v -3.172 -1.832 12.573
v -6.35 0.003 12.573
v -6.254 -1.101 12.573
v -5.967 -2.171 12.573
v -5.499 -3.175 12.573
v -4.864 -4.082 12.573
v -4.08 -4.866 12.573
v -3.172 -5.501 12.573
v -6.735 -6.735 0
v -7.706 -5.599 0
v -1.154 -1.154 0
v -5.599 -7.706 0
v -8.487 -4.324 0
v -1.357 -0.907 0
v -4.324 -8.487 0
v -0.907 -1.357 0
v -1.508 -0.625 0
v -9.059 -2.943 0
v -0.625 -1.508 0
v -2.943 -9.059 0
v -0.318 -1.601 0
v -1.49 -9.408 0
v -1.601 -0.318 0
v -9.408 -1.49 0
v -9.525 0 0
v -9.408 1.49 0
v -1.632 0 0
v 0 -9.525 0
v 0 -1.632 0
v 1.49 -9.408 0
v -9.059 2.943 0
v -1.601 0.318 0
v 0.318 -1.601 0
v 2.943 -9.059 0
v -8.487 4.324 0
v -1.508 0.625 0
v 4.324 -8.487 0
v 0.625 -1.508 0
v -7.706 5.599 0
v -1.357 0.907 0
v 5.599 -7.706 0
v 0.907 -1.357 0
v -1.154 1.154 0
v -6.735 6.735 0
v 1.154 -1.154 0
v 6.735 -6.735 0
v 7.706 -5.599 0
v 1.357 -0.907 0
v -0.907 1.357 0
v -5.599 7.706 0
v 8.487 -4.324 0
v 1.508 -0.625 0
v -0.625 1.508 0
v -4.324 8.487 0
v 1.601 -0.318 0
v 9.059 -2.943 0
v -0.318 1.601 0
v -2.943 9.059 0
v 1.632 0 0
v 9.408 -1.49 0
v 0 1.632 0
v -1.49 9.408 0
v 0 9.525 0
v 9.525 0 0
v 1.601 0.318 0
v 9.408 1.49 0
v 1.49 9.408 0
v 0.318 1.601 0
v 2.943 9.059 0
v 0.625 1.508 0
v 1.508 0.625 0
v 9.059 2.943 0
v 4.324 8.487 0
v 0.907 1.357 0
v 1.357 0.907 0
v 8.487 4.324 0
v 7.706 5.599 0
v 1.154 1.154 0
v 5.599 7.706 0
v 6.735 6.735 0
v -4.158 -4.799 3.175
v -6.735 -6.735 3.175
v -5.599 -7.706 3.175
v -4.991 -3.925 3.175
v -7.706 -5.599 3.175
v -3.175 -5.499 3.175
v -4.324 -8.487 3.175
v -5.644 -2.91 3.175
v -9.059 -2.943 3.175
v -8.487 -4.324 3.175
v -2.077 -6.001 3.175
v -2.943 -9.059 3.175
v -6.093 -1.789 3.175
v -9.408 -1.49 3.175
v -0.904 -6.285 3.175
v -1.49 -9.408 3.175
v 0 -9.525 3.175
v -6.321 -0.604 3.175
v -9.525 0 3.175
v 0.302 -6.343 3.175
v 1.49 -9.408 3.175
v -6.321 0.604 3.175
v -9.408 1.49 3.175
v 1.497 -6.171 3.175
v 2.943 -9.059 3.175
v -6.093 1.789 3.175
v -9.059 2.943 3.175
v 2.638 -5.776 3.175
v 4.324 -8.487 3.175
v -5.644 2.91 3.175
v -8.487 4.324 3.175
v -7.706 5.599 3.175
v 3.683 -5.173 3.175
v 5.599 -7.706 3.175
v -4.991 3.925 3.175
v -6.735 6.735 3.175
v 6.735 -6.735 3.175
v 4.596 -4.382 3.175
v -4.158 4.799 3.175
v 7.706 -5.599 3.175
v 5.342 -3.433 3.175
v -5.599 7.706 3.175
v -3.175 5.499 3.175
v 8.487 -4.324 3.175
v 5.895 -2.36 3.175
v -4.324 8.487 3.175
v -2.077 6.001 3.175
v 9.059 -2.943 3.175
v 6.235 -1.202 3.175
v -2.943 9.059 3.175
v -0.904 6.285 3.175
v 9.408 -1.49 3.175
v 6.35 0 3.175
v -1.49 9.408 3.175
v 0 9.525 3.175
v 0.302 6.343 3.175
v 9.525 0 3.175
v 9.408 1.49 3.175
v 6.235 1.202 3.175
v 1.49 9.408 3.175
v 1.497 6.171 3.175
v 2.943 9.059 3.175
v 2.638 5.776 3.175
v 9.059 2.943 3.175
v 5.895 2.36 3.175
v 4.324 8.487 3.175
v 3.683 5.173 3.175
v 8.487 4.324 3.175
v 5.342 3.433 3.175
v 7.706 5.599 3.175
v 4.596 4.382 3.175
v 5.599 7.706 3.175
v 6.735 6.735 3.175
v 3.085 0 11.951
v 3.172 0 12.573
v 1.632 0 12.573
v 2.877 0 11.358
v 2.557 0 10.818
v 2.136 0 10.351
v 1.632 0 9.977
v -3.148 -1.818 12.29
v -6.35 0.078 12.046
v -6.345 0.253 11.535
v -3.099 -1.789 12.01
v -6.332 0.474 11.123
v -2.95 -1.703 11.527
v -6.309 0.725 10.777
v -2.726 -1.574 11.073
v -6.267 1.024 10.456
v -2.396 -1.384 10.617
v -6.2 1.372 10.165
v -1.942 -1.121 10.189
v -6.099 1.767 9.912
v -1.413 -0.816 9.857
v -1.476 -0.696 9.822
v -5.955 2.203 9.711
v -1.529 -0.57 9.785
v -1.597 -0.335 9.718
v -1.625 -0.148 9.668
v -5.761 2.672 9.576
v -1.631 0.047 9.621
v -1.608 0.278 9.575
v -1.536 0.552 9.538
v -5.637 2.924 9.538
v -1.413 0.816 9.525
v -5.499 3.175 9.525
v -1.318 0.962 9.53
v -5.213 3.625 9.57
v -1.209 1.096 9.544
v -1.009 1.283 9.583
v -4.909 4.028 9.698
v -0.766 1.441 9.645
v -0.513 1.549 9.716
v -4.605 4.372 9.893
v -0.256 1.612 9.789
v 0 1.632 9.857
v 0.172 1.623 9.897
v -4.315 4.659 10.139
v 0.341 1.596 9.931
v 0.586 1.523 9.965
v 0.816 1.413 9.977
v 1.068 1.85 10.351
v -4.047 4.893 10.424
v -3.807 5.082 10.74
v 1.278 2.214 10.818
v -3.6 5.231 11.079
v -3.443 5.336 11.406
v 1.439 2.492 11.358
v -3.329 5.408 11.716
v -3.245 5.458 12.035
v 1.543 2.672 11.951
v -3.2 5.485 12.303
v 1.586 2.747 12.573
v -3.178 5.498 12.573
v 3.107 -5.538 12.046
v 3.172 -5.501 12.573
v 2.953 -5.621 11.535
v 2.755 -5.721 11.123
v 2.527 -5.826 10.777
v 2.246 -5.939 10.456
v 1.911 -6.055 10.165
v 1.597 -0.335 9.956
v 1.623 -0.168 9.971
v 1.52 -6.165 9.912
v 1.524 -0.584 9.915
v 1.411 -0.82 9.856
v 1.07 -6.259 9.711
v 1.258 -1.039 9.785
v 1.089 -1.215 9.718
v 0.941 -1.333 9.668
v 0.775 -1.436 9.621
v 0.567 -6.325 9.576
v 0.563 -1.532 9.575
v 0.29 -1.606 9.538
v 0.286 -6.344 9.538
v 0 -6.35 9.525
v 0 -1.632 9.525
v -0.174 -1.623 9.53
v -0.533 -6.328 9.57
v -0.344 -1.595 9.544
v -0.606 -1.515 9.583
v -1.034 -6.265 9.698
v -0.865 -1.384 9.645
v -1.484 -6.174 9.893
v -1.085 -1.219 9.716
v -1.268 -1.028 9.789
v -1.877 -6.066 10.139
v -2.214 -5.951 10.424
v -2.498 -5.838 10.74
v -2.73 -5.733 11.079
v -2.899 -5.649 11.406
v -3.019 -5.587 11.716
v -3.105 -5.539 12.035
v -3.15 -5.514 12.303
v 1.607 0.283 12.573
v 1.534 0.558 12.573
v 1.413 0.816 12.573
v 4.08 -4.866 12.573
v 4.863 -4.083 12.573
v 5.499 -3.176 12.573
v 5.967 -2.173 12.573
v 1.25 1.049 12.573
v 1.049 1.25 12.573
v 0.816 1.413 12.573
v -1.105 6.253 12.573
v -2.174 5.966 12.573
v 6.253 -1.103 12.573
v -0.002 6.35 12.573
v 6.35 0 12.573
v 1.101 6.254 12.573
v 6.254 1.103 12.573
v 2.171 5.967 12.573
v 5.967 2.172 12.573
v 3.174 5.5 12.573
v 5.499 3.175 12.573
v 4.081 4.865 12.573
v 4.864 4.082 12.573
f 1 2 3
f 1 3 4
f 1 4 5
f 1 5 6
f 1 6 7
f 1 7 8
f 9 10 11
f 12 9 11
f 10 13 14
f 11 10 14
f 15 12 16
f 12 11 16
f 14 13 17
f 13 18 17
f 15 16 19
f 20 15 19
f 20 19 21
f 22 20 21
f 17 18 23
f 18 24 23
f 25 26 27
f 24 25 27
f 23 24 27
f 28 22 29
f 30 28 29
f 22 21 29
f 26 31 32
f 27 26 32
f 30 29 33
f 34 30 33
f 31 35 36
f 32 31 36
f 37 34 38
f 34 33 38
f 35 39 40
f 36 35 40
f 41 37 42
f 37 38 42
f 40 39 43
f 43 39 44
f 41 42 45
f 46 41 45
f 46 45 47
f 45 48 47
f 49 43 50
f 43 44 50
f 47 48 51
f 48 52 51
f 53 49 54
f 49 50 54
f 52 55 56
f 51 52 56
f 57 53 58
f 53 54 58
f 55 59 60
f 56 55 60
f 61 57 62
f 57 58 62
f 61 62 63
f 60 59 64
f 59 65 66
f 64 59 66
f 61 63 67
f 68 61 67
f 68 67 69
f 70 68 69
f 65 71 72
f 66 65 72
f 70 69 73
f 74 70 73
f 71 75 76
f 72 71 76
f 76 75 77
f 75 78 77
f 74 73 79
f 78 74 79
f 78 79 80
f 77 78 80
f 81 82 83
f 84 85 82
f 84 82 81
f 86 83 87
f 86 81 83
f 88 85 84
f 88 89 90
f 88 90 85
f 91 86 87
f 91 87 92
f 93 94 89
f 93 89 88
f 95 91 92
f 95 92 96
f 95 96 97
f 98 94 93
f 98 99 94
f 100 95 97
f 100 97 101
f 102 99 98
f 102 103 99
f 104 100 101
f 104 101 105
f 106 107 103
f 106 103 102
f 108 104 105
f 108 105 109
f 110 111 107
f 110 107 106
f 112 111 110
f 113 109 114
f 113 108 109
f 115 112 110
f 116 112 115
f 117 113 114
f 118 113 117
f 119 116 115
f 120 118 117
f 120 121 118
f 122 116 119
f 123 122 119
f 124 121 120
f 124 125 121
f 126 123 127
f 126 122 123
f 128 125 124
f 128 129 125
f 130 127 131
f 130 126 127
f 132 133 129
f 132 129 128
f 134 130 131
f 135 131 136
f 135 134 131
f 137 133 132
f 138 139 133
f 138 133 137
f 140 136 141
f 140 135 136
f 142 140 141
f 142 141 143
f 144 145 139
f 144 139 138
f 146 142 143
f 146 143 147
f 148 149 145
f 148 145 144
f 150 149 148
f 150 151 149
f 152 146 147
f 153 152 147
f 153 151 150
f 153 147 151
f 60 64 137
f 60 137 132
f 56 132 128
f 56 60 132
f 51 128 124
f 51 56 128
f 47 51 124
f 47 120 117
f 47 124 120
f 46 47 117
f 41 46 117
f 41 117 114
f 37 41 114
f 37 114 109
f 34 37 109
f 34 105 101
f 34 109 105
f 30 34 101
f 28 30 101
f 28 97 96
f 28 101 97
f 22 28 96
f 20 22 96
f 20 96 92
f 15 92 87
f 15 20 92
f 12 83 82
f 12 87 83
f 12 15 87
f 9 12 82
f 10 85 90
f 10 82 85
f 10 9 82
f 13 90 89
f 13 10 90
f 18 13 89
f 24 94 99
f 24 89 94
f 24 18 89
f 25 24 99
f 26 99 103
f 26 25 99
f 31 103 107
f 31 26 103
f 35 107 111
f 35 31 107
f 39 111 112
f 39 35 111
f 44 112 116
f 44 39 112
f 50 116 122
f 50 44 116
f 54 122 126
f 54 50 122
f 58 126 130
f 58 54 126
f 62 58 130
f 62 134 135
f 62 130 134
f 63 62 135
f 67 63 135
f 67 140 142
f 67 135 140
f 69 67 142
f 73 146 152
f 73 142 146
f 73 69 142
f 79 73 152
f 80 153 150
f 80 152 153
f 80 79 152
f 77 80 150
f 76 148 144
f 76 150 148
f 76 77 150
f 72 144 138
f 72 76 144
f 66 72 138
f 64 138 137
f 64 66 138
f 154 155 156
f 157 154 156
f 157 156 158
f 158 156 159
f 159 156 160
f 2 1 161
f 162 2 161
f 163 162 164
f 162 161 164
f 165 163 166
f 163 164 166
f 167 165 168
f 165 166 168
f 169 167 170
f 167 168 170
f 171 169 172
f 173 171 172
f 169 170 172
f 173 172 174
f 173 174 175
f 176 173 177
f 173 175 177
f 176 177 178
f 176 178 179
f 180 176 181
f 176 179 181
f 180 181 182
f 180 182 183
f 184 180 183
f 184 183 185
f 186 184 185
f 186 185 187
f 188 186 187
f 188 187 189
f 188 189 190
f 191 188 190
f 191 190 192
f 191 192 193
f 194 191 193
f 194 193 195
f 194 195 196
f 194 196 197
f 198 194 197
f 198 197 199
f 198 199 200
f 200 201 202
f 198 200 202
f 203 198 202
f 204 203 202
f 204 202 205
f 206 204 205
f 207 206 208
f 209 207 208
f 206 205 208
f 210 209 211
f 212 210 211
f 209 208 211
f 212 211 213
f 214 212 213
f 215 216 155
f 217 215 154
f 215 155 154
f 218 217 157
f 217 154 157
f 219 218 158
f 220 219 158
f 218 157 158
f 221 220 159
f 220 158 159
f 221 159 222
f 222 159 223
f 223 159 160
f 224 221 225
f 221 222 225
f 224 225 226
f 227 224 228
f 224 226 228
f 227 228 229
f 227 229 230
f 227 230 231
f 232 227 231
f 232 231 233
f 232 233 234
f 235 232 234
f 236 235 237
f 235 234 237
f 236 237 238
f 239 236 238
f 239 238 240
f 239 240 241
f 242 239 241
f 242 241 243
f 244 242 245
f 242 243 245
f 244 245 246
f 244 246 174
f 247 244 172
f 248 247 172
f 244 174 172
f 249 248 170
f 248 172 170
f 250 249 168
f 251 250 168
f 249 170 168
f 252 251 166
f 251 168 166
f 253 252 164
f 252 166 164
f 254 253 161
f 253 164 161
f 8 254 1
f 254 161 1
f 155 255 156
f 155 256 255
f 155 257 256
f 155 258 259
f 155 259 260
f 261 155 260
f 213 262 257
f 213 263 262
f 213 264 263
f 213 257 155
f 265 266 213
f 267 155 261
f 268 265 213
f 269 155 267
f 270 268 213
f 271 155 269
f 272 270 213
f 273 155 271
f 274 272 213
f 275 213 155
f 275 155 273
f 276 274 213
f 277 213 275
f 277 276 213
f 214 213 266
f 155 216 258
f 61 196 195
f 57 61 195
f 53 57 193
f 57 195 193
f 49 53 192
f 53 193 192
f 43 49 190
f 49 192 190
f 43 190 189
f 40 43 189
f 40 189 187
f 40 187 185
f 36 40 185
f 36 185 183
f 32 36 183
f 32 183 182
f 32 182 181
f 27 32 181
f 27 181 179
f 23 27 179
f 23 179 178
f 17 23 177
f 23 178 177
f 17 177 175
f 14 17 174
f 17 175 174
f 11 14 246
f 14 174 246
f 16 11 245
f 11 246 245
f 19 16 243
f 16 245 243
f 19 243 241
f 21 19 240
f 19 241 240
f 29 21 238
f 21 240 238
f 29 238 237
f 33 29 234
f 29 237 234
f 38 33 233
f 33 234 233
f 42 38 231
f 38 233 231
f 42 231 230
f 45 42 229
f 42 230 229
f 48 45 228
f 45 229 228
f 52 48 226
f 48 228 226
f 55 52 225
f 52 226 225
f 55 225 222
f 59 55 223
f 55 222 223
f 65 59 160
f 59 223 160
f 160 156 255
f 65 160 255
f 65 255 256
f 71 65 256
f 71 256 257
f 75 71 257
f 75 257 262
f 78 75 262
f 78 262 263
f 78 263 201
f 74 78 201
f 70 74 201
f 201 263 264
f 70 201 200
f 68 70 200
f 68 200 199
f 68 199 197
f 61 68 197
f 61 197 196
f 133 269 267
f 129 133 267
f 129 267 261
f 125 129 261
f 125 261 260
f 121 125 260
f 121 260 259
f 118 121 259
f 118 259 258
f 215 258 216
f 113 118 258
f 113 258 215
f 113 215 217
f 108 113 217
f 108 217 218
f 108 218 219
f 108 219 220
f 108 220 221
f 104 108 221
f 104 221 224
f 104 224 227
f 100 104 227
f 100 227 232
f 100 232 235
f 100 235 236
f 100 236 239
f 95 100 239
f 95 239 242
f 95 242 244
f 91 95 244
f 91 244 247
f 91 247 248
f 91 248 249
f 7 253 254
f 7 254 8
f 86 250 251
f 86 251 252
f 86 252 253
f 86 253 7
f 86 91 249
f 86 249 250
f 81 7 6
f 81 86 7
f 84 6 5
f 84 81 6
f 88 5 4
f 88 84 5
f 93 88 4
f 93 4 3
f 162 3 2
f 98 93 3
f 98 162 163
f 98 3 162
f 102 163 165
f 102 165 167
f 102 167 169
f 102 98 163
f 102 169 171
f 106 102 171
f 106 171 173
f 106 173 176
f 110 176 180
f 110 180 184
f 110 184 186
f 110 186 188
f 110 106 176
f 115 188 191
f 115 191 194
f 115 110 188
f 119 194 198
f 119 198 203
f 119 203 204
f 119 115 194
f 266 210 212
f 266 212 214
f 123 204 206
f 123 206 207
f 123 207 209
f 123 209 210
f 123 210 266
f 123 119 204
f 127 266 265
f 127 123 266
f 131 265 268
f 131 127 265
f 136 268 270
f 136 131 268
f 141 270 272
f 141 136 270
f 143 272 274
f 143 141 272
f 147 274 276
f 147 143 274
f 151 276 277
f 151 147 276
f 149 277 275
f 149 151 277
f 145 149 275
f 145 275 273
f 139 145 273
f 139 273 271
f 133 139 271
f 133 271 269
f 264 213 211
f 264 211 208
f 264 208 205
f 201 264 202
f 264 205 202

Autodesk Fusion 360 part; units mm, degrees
sketch "Sketch1" plane through (0, 0, 0) normal (0, 0, 1) x (1, 0, 0)
  circle A0 centre (0, 0) radius 6.35
  circle A1 centre (0, 0) radius 9.525
  dimension "d1" = 12.7
  dimension "d24" = 19.05
extrude "Extrude1" add sketch "Sketch1" along normal blind 12.7 contours A0
ref_plane "WorkPlane1" through (0, -6.35, 16.0163) normal (0, -1, 0) x (-1, 0, 0)
sketch "Sketch2" plane through (0, -6.35, 16.0163) normal (0, -1, 0) x (1, 0, 0)
  line L0 (6.35, -3.3163) -> (-6.35, -3.3163)
  line L1 (6.35, -16.0163) -> (-6.35, -16.0163)
  point P0 (0, -3.3163)
ref_plane "WorkPlane2" through (0, 0, 9.525) normal (0, 0, 1) x (1, 0, 0)
sketch "Sketch4" plane through (0, 0, 9.525) normal (0, 0, 1) x (1, 0, 0)
  circle A0 centre (0, 0) radius 6.35
  line L0 (0, 0) -> (0, -6.35) construction
  line L1 (0, 0) -> (5.4993, 3.175) construction
  line L2 (0, 0) -> (-5.4993, 3.175) construction
  dimension "d22" = 360
hole "Hole1" at (0, -6.35, 12.7) direction (0, 1, 0) diameter 6.35 depth 6.35 tip angle 180
pattern_circular "C-Pattern1" count 3 over 360 about axis through (0, 0, 0) along (0, 0, 1) of "Hole1"
extrude "Extrude2" cut sketch "Sketch4" against normal blind 0.127 from surface at 3.175
hole "Hole2" at (0, 0, 0) direction (0, 0, 1) diameter 3.2639 depth 12.573 tip angle 180
extrude "Extrude3" add sketch "Sketch1" along normal blind 3.175
equation "d5 = d1 / 2"
